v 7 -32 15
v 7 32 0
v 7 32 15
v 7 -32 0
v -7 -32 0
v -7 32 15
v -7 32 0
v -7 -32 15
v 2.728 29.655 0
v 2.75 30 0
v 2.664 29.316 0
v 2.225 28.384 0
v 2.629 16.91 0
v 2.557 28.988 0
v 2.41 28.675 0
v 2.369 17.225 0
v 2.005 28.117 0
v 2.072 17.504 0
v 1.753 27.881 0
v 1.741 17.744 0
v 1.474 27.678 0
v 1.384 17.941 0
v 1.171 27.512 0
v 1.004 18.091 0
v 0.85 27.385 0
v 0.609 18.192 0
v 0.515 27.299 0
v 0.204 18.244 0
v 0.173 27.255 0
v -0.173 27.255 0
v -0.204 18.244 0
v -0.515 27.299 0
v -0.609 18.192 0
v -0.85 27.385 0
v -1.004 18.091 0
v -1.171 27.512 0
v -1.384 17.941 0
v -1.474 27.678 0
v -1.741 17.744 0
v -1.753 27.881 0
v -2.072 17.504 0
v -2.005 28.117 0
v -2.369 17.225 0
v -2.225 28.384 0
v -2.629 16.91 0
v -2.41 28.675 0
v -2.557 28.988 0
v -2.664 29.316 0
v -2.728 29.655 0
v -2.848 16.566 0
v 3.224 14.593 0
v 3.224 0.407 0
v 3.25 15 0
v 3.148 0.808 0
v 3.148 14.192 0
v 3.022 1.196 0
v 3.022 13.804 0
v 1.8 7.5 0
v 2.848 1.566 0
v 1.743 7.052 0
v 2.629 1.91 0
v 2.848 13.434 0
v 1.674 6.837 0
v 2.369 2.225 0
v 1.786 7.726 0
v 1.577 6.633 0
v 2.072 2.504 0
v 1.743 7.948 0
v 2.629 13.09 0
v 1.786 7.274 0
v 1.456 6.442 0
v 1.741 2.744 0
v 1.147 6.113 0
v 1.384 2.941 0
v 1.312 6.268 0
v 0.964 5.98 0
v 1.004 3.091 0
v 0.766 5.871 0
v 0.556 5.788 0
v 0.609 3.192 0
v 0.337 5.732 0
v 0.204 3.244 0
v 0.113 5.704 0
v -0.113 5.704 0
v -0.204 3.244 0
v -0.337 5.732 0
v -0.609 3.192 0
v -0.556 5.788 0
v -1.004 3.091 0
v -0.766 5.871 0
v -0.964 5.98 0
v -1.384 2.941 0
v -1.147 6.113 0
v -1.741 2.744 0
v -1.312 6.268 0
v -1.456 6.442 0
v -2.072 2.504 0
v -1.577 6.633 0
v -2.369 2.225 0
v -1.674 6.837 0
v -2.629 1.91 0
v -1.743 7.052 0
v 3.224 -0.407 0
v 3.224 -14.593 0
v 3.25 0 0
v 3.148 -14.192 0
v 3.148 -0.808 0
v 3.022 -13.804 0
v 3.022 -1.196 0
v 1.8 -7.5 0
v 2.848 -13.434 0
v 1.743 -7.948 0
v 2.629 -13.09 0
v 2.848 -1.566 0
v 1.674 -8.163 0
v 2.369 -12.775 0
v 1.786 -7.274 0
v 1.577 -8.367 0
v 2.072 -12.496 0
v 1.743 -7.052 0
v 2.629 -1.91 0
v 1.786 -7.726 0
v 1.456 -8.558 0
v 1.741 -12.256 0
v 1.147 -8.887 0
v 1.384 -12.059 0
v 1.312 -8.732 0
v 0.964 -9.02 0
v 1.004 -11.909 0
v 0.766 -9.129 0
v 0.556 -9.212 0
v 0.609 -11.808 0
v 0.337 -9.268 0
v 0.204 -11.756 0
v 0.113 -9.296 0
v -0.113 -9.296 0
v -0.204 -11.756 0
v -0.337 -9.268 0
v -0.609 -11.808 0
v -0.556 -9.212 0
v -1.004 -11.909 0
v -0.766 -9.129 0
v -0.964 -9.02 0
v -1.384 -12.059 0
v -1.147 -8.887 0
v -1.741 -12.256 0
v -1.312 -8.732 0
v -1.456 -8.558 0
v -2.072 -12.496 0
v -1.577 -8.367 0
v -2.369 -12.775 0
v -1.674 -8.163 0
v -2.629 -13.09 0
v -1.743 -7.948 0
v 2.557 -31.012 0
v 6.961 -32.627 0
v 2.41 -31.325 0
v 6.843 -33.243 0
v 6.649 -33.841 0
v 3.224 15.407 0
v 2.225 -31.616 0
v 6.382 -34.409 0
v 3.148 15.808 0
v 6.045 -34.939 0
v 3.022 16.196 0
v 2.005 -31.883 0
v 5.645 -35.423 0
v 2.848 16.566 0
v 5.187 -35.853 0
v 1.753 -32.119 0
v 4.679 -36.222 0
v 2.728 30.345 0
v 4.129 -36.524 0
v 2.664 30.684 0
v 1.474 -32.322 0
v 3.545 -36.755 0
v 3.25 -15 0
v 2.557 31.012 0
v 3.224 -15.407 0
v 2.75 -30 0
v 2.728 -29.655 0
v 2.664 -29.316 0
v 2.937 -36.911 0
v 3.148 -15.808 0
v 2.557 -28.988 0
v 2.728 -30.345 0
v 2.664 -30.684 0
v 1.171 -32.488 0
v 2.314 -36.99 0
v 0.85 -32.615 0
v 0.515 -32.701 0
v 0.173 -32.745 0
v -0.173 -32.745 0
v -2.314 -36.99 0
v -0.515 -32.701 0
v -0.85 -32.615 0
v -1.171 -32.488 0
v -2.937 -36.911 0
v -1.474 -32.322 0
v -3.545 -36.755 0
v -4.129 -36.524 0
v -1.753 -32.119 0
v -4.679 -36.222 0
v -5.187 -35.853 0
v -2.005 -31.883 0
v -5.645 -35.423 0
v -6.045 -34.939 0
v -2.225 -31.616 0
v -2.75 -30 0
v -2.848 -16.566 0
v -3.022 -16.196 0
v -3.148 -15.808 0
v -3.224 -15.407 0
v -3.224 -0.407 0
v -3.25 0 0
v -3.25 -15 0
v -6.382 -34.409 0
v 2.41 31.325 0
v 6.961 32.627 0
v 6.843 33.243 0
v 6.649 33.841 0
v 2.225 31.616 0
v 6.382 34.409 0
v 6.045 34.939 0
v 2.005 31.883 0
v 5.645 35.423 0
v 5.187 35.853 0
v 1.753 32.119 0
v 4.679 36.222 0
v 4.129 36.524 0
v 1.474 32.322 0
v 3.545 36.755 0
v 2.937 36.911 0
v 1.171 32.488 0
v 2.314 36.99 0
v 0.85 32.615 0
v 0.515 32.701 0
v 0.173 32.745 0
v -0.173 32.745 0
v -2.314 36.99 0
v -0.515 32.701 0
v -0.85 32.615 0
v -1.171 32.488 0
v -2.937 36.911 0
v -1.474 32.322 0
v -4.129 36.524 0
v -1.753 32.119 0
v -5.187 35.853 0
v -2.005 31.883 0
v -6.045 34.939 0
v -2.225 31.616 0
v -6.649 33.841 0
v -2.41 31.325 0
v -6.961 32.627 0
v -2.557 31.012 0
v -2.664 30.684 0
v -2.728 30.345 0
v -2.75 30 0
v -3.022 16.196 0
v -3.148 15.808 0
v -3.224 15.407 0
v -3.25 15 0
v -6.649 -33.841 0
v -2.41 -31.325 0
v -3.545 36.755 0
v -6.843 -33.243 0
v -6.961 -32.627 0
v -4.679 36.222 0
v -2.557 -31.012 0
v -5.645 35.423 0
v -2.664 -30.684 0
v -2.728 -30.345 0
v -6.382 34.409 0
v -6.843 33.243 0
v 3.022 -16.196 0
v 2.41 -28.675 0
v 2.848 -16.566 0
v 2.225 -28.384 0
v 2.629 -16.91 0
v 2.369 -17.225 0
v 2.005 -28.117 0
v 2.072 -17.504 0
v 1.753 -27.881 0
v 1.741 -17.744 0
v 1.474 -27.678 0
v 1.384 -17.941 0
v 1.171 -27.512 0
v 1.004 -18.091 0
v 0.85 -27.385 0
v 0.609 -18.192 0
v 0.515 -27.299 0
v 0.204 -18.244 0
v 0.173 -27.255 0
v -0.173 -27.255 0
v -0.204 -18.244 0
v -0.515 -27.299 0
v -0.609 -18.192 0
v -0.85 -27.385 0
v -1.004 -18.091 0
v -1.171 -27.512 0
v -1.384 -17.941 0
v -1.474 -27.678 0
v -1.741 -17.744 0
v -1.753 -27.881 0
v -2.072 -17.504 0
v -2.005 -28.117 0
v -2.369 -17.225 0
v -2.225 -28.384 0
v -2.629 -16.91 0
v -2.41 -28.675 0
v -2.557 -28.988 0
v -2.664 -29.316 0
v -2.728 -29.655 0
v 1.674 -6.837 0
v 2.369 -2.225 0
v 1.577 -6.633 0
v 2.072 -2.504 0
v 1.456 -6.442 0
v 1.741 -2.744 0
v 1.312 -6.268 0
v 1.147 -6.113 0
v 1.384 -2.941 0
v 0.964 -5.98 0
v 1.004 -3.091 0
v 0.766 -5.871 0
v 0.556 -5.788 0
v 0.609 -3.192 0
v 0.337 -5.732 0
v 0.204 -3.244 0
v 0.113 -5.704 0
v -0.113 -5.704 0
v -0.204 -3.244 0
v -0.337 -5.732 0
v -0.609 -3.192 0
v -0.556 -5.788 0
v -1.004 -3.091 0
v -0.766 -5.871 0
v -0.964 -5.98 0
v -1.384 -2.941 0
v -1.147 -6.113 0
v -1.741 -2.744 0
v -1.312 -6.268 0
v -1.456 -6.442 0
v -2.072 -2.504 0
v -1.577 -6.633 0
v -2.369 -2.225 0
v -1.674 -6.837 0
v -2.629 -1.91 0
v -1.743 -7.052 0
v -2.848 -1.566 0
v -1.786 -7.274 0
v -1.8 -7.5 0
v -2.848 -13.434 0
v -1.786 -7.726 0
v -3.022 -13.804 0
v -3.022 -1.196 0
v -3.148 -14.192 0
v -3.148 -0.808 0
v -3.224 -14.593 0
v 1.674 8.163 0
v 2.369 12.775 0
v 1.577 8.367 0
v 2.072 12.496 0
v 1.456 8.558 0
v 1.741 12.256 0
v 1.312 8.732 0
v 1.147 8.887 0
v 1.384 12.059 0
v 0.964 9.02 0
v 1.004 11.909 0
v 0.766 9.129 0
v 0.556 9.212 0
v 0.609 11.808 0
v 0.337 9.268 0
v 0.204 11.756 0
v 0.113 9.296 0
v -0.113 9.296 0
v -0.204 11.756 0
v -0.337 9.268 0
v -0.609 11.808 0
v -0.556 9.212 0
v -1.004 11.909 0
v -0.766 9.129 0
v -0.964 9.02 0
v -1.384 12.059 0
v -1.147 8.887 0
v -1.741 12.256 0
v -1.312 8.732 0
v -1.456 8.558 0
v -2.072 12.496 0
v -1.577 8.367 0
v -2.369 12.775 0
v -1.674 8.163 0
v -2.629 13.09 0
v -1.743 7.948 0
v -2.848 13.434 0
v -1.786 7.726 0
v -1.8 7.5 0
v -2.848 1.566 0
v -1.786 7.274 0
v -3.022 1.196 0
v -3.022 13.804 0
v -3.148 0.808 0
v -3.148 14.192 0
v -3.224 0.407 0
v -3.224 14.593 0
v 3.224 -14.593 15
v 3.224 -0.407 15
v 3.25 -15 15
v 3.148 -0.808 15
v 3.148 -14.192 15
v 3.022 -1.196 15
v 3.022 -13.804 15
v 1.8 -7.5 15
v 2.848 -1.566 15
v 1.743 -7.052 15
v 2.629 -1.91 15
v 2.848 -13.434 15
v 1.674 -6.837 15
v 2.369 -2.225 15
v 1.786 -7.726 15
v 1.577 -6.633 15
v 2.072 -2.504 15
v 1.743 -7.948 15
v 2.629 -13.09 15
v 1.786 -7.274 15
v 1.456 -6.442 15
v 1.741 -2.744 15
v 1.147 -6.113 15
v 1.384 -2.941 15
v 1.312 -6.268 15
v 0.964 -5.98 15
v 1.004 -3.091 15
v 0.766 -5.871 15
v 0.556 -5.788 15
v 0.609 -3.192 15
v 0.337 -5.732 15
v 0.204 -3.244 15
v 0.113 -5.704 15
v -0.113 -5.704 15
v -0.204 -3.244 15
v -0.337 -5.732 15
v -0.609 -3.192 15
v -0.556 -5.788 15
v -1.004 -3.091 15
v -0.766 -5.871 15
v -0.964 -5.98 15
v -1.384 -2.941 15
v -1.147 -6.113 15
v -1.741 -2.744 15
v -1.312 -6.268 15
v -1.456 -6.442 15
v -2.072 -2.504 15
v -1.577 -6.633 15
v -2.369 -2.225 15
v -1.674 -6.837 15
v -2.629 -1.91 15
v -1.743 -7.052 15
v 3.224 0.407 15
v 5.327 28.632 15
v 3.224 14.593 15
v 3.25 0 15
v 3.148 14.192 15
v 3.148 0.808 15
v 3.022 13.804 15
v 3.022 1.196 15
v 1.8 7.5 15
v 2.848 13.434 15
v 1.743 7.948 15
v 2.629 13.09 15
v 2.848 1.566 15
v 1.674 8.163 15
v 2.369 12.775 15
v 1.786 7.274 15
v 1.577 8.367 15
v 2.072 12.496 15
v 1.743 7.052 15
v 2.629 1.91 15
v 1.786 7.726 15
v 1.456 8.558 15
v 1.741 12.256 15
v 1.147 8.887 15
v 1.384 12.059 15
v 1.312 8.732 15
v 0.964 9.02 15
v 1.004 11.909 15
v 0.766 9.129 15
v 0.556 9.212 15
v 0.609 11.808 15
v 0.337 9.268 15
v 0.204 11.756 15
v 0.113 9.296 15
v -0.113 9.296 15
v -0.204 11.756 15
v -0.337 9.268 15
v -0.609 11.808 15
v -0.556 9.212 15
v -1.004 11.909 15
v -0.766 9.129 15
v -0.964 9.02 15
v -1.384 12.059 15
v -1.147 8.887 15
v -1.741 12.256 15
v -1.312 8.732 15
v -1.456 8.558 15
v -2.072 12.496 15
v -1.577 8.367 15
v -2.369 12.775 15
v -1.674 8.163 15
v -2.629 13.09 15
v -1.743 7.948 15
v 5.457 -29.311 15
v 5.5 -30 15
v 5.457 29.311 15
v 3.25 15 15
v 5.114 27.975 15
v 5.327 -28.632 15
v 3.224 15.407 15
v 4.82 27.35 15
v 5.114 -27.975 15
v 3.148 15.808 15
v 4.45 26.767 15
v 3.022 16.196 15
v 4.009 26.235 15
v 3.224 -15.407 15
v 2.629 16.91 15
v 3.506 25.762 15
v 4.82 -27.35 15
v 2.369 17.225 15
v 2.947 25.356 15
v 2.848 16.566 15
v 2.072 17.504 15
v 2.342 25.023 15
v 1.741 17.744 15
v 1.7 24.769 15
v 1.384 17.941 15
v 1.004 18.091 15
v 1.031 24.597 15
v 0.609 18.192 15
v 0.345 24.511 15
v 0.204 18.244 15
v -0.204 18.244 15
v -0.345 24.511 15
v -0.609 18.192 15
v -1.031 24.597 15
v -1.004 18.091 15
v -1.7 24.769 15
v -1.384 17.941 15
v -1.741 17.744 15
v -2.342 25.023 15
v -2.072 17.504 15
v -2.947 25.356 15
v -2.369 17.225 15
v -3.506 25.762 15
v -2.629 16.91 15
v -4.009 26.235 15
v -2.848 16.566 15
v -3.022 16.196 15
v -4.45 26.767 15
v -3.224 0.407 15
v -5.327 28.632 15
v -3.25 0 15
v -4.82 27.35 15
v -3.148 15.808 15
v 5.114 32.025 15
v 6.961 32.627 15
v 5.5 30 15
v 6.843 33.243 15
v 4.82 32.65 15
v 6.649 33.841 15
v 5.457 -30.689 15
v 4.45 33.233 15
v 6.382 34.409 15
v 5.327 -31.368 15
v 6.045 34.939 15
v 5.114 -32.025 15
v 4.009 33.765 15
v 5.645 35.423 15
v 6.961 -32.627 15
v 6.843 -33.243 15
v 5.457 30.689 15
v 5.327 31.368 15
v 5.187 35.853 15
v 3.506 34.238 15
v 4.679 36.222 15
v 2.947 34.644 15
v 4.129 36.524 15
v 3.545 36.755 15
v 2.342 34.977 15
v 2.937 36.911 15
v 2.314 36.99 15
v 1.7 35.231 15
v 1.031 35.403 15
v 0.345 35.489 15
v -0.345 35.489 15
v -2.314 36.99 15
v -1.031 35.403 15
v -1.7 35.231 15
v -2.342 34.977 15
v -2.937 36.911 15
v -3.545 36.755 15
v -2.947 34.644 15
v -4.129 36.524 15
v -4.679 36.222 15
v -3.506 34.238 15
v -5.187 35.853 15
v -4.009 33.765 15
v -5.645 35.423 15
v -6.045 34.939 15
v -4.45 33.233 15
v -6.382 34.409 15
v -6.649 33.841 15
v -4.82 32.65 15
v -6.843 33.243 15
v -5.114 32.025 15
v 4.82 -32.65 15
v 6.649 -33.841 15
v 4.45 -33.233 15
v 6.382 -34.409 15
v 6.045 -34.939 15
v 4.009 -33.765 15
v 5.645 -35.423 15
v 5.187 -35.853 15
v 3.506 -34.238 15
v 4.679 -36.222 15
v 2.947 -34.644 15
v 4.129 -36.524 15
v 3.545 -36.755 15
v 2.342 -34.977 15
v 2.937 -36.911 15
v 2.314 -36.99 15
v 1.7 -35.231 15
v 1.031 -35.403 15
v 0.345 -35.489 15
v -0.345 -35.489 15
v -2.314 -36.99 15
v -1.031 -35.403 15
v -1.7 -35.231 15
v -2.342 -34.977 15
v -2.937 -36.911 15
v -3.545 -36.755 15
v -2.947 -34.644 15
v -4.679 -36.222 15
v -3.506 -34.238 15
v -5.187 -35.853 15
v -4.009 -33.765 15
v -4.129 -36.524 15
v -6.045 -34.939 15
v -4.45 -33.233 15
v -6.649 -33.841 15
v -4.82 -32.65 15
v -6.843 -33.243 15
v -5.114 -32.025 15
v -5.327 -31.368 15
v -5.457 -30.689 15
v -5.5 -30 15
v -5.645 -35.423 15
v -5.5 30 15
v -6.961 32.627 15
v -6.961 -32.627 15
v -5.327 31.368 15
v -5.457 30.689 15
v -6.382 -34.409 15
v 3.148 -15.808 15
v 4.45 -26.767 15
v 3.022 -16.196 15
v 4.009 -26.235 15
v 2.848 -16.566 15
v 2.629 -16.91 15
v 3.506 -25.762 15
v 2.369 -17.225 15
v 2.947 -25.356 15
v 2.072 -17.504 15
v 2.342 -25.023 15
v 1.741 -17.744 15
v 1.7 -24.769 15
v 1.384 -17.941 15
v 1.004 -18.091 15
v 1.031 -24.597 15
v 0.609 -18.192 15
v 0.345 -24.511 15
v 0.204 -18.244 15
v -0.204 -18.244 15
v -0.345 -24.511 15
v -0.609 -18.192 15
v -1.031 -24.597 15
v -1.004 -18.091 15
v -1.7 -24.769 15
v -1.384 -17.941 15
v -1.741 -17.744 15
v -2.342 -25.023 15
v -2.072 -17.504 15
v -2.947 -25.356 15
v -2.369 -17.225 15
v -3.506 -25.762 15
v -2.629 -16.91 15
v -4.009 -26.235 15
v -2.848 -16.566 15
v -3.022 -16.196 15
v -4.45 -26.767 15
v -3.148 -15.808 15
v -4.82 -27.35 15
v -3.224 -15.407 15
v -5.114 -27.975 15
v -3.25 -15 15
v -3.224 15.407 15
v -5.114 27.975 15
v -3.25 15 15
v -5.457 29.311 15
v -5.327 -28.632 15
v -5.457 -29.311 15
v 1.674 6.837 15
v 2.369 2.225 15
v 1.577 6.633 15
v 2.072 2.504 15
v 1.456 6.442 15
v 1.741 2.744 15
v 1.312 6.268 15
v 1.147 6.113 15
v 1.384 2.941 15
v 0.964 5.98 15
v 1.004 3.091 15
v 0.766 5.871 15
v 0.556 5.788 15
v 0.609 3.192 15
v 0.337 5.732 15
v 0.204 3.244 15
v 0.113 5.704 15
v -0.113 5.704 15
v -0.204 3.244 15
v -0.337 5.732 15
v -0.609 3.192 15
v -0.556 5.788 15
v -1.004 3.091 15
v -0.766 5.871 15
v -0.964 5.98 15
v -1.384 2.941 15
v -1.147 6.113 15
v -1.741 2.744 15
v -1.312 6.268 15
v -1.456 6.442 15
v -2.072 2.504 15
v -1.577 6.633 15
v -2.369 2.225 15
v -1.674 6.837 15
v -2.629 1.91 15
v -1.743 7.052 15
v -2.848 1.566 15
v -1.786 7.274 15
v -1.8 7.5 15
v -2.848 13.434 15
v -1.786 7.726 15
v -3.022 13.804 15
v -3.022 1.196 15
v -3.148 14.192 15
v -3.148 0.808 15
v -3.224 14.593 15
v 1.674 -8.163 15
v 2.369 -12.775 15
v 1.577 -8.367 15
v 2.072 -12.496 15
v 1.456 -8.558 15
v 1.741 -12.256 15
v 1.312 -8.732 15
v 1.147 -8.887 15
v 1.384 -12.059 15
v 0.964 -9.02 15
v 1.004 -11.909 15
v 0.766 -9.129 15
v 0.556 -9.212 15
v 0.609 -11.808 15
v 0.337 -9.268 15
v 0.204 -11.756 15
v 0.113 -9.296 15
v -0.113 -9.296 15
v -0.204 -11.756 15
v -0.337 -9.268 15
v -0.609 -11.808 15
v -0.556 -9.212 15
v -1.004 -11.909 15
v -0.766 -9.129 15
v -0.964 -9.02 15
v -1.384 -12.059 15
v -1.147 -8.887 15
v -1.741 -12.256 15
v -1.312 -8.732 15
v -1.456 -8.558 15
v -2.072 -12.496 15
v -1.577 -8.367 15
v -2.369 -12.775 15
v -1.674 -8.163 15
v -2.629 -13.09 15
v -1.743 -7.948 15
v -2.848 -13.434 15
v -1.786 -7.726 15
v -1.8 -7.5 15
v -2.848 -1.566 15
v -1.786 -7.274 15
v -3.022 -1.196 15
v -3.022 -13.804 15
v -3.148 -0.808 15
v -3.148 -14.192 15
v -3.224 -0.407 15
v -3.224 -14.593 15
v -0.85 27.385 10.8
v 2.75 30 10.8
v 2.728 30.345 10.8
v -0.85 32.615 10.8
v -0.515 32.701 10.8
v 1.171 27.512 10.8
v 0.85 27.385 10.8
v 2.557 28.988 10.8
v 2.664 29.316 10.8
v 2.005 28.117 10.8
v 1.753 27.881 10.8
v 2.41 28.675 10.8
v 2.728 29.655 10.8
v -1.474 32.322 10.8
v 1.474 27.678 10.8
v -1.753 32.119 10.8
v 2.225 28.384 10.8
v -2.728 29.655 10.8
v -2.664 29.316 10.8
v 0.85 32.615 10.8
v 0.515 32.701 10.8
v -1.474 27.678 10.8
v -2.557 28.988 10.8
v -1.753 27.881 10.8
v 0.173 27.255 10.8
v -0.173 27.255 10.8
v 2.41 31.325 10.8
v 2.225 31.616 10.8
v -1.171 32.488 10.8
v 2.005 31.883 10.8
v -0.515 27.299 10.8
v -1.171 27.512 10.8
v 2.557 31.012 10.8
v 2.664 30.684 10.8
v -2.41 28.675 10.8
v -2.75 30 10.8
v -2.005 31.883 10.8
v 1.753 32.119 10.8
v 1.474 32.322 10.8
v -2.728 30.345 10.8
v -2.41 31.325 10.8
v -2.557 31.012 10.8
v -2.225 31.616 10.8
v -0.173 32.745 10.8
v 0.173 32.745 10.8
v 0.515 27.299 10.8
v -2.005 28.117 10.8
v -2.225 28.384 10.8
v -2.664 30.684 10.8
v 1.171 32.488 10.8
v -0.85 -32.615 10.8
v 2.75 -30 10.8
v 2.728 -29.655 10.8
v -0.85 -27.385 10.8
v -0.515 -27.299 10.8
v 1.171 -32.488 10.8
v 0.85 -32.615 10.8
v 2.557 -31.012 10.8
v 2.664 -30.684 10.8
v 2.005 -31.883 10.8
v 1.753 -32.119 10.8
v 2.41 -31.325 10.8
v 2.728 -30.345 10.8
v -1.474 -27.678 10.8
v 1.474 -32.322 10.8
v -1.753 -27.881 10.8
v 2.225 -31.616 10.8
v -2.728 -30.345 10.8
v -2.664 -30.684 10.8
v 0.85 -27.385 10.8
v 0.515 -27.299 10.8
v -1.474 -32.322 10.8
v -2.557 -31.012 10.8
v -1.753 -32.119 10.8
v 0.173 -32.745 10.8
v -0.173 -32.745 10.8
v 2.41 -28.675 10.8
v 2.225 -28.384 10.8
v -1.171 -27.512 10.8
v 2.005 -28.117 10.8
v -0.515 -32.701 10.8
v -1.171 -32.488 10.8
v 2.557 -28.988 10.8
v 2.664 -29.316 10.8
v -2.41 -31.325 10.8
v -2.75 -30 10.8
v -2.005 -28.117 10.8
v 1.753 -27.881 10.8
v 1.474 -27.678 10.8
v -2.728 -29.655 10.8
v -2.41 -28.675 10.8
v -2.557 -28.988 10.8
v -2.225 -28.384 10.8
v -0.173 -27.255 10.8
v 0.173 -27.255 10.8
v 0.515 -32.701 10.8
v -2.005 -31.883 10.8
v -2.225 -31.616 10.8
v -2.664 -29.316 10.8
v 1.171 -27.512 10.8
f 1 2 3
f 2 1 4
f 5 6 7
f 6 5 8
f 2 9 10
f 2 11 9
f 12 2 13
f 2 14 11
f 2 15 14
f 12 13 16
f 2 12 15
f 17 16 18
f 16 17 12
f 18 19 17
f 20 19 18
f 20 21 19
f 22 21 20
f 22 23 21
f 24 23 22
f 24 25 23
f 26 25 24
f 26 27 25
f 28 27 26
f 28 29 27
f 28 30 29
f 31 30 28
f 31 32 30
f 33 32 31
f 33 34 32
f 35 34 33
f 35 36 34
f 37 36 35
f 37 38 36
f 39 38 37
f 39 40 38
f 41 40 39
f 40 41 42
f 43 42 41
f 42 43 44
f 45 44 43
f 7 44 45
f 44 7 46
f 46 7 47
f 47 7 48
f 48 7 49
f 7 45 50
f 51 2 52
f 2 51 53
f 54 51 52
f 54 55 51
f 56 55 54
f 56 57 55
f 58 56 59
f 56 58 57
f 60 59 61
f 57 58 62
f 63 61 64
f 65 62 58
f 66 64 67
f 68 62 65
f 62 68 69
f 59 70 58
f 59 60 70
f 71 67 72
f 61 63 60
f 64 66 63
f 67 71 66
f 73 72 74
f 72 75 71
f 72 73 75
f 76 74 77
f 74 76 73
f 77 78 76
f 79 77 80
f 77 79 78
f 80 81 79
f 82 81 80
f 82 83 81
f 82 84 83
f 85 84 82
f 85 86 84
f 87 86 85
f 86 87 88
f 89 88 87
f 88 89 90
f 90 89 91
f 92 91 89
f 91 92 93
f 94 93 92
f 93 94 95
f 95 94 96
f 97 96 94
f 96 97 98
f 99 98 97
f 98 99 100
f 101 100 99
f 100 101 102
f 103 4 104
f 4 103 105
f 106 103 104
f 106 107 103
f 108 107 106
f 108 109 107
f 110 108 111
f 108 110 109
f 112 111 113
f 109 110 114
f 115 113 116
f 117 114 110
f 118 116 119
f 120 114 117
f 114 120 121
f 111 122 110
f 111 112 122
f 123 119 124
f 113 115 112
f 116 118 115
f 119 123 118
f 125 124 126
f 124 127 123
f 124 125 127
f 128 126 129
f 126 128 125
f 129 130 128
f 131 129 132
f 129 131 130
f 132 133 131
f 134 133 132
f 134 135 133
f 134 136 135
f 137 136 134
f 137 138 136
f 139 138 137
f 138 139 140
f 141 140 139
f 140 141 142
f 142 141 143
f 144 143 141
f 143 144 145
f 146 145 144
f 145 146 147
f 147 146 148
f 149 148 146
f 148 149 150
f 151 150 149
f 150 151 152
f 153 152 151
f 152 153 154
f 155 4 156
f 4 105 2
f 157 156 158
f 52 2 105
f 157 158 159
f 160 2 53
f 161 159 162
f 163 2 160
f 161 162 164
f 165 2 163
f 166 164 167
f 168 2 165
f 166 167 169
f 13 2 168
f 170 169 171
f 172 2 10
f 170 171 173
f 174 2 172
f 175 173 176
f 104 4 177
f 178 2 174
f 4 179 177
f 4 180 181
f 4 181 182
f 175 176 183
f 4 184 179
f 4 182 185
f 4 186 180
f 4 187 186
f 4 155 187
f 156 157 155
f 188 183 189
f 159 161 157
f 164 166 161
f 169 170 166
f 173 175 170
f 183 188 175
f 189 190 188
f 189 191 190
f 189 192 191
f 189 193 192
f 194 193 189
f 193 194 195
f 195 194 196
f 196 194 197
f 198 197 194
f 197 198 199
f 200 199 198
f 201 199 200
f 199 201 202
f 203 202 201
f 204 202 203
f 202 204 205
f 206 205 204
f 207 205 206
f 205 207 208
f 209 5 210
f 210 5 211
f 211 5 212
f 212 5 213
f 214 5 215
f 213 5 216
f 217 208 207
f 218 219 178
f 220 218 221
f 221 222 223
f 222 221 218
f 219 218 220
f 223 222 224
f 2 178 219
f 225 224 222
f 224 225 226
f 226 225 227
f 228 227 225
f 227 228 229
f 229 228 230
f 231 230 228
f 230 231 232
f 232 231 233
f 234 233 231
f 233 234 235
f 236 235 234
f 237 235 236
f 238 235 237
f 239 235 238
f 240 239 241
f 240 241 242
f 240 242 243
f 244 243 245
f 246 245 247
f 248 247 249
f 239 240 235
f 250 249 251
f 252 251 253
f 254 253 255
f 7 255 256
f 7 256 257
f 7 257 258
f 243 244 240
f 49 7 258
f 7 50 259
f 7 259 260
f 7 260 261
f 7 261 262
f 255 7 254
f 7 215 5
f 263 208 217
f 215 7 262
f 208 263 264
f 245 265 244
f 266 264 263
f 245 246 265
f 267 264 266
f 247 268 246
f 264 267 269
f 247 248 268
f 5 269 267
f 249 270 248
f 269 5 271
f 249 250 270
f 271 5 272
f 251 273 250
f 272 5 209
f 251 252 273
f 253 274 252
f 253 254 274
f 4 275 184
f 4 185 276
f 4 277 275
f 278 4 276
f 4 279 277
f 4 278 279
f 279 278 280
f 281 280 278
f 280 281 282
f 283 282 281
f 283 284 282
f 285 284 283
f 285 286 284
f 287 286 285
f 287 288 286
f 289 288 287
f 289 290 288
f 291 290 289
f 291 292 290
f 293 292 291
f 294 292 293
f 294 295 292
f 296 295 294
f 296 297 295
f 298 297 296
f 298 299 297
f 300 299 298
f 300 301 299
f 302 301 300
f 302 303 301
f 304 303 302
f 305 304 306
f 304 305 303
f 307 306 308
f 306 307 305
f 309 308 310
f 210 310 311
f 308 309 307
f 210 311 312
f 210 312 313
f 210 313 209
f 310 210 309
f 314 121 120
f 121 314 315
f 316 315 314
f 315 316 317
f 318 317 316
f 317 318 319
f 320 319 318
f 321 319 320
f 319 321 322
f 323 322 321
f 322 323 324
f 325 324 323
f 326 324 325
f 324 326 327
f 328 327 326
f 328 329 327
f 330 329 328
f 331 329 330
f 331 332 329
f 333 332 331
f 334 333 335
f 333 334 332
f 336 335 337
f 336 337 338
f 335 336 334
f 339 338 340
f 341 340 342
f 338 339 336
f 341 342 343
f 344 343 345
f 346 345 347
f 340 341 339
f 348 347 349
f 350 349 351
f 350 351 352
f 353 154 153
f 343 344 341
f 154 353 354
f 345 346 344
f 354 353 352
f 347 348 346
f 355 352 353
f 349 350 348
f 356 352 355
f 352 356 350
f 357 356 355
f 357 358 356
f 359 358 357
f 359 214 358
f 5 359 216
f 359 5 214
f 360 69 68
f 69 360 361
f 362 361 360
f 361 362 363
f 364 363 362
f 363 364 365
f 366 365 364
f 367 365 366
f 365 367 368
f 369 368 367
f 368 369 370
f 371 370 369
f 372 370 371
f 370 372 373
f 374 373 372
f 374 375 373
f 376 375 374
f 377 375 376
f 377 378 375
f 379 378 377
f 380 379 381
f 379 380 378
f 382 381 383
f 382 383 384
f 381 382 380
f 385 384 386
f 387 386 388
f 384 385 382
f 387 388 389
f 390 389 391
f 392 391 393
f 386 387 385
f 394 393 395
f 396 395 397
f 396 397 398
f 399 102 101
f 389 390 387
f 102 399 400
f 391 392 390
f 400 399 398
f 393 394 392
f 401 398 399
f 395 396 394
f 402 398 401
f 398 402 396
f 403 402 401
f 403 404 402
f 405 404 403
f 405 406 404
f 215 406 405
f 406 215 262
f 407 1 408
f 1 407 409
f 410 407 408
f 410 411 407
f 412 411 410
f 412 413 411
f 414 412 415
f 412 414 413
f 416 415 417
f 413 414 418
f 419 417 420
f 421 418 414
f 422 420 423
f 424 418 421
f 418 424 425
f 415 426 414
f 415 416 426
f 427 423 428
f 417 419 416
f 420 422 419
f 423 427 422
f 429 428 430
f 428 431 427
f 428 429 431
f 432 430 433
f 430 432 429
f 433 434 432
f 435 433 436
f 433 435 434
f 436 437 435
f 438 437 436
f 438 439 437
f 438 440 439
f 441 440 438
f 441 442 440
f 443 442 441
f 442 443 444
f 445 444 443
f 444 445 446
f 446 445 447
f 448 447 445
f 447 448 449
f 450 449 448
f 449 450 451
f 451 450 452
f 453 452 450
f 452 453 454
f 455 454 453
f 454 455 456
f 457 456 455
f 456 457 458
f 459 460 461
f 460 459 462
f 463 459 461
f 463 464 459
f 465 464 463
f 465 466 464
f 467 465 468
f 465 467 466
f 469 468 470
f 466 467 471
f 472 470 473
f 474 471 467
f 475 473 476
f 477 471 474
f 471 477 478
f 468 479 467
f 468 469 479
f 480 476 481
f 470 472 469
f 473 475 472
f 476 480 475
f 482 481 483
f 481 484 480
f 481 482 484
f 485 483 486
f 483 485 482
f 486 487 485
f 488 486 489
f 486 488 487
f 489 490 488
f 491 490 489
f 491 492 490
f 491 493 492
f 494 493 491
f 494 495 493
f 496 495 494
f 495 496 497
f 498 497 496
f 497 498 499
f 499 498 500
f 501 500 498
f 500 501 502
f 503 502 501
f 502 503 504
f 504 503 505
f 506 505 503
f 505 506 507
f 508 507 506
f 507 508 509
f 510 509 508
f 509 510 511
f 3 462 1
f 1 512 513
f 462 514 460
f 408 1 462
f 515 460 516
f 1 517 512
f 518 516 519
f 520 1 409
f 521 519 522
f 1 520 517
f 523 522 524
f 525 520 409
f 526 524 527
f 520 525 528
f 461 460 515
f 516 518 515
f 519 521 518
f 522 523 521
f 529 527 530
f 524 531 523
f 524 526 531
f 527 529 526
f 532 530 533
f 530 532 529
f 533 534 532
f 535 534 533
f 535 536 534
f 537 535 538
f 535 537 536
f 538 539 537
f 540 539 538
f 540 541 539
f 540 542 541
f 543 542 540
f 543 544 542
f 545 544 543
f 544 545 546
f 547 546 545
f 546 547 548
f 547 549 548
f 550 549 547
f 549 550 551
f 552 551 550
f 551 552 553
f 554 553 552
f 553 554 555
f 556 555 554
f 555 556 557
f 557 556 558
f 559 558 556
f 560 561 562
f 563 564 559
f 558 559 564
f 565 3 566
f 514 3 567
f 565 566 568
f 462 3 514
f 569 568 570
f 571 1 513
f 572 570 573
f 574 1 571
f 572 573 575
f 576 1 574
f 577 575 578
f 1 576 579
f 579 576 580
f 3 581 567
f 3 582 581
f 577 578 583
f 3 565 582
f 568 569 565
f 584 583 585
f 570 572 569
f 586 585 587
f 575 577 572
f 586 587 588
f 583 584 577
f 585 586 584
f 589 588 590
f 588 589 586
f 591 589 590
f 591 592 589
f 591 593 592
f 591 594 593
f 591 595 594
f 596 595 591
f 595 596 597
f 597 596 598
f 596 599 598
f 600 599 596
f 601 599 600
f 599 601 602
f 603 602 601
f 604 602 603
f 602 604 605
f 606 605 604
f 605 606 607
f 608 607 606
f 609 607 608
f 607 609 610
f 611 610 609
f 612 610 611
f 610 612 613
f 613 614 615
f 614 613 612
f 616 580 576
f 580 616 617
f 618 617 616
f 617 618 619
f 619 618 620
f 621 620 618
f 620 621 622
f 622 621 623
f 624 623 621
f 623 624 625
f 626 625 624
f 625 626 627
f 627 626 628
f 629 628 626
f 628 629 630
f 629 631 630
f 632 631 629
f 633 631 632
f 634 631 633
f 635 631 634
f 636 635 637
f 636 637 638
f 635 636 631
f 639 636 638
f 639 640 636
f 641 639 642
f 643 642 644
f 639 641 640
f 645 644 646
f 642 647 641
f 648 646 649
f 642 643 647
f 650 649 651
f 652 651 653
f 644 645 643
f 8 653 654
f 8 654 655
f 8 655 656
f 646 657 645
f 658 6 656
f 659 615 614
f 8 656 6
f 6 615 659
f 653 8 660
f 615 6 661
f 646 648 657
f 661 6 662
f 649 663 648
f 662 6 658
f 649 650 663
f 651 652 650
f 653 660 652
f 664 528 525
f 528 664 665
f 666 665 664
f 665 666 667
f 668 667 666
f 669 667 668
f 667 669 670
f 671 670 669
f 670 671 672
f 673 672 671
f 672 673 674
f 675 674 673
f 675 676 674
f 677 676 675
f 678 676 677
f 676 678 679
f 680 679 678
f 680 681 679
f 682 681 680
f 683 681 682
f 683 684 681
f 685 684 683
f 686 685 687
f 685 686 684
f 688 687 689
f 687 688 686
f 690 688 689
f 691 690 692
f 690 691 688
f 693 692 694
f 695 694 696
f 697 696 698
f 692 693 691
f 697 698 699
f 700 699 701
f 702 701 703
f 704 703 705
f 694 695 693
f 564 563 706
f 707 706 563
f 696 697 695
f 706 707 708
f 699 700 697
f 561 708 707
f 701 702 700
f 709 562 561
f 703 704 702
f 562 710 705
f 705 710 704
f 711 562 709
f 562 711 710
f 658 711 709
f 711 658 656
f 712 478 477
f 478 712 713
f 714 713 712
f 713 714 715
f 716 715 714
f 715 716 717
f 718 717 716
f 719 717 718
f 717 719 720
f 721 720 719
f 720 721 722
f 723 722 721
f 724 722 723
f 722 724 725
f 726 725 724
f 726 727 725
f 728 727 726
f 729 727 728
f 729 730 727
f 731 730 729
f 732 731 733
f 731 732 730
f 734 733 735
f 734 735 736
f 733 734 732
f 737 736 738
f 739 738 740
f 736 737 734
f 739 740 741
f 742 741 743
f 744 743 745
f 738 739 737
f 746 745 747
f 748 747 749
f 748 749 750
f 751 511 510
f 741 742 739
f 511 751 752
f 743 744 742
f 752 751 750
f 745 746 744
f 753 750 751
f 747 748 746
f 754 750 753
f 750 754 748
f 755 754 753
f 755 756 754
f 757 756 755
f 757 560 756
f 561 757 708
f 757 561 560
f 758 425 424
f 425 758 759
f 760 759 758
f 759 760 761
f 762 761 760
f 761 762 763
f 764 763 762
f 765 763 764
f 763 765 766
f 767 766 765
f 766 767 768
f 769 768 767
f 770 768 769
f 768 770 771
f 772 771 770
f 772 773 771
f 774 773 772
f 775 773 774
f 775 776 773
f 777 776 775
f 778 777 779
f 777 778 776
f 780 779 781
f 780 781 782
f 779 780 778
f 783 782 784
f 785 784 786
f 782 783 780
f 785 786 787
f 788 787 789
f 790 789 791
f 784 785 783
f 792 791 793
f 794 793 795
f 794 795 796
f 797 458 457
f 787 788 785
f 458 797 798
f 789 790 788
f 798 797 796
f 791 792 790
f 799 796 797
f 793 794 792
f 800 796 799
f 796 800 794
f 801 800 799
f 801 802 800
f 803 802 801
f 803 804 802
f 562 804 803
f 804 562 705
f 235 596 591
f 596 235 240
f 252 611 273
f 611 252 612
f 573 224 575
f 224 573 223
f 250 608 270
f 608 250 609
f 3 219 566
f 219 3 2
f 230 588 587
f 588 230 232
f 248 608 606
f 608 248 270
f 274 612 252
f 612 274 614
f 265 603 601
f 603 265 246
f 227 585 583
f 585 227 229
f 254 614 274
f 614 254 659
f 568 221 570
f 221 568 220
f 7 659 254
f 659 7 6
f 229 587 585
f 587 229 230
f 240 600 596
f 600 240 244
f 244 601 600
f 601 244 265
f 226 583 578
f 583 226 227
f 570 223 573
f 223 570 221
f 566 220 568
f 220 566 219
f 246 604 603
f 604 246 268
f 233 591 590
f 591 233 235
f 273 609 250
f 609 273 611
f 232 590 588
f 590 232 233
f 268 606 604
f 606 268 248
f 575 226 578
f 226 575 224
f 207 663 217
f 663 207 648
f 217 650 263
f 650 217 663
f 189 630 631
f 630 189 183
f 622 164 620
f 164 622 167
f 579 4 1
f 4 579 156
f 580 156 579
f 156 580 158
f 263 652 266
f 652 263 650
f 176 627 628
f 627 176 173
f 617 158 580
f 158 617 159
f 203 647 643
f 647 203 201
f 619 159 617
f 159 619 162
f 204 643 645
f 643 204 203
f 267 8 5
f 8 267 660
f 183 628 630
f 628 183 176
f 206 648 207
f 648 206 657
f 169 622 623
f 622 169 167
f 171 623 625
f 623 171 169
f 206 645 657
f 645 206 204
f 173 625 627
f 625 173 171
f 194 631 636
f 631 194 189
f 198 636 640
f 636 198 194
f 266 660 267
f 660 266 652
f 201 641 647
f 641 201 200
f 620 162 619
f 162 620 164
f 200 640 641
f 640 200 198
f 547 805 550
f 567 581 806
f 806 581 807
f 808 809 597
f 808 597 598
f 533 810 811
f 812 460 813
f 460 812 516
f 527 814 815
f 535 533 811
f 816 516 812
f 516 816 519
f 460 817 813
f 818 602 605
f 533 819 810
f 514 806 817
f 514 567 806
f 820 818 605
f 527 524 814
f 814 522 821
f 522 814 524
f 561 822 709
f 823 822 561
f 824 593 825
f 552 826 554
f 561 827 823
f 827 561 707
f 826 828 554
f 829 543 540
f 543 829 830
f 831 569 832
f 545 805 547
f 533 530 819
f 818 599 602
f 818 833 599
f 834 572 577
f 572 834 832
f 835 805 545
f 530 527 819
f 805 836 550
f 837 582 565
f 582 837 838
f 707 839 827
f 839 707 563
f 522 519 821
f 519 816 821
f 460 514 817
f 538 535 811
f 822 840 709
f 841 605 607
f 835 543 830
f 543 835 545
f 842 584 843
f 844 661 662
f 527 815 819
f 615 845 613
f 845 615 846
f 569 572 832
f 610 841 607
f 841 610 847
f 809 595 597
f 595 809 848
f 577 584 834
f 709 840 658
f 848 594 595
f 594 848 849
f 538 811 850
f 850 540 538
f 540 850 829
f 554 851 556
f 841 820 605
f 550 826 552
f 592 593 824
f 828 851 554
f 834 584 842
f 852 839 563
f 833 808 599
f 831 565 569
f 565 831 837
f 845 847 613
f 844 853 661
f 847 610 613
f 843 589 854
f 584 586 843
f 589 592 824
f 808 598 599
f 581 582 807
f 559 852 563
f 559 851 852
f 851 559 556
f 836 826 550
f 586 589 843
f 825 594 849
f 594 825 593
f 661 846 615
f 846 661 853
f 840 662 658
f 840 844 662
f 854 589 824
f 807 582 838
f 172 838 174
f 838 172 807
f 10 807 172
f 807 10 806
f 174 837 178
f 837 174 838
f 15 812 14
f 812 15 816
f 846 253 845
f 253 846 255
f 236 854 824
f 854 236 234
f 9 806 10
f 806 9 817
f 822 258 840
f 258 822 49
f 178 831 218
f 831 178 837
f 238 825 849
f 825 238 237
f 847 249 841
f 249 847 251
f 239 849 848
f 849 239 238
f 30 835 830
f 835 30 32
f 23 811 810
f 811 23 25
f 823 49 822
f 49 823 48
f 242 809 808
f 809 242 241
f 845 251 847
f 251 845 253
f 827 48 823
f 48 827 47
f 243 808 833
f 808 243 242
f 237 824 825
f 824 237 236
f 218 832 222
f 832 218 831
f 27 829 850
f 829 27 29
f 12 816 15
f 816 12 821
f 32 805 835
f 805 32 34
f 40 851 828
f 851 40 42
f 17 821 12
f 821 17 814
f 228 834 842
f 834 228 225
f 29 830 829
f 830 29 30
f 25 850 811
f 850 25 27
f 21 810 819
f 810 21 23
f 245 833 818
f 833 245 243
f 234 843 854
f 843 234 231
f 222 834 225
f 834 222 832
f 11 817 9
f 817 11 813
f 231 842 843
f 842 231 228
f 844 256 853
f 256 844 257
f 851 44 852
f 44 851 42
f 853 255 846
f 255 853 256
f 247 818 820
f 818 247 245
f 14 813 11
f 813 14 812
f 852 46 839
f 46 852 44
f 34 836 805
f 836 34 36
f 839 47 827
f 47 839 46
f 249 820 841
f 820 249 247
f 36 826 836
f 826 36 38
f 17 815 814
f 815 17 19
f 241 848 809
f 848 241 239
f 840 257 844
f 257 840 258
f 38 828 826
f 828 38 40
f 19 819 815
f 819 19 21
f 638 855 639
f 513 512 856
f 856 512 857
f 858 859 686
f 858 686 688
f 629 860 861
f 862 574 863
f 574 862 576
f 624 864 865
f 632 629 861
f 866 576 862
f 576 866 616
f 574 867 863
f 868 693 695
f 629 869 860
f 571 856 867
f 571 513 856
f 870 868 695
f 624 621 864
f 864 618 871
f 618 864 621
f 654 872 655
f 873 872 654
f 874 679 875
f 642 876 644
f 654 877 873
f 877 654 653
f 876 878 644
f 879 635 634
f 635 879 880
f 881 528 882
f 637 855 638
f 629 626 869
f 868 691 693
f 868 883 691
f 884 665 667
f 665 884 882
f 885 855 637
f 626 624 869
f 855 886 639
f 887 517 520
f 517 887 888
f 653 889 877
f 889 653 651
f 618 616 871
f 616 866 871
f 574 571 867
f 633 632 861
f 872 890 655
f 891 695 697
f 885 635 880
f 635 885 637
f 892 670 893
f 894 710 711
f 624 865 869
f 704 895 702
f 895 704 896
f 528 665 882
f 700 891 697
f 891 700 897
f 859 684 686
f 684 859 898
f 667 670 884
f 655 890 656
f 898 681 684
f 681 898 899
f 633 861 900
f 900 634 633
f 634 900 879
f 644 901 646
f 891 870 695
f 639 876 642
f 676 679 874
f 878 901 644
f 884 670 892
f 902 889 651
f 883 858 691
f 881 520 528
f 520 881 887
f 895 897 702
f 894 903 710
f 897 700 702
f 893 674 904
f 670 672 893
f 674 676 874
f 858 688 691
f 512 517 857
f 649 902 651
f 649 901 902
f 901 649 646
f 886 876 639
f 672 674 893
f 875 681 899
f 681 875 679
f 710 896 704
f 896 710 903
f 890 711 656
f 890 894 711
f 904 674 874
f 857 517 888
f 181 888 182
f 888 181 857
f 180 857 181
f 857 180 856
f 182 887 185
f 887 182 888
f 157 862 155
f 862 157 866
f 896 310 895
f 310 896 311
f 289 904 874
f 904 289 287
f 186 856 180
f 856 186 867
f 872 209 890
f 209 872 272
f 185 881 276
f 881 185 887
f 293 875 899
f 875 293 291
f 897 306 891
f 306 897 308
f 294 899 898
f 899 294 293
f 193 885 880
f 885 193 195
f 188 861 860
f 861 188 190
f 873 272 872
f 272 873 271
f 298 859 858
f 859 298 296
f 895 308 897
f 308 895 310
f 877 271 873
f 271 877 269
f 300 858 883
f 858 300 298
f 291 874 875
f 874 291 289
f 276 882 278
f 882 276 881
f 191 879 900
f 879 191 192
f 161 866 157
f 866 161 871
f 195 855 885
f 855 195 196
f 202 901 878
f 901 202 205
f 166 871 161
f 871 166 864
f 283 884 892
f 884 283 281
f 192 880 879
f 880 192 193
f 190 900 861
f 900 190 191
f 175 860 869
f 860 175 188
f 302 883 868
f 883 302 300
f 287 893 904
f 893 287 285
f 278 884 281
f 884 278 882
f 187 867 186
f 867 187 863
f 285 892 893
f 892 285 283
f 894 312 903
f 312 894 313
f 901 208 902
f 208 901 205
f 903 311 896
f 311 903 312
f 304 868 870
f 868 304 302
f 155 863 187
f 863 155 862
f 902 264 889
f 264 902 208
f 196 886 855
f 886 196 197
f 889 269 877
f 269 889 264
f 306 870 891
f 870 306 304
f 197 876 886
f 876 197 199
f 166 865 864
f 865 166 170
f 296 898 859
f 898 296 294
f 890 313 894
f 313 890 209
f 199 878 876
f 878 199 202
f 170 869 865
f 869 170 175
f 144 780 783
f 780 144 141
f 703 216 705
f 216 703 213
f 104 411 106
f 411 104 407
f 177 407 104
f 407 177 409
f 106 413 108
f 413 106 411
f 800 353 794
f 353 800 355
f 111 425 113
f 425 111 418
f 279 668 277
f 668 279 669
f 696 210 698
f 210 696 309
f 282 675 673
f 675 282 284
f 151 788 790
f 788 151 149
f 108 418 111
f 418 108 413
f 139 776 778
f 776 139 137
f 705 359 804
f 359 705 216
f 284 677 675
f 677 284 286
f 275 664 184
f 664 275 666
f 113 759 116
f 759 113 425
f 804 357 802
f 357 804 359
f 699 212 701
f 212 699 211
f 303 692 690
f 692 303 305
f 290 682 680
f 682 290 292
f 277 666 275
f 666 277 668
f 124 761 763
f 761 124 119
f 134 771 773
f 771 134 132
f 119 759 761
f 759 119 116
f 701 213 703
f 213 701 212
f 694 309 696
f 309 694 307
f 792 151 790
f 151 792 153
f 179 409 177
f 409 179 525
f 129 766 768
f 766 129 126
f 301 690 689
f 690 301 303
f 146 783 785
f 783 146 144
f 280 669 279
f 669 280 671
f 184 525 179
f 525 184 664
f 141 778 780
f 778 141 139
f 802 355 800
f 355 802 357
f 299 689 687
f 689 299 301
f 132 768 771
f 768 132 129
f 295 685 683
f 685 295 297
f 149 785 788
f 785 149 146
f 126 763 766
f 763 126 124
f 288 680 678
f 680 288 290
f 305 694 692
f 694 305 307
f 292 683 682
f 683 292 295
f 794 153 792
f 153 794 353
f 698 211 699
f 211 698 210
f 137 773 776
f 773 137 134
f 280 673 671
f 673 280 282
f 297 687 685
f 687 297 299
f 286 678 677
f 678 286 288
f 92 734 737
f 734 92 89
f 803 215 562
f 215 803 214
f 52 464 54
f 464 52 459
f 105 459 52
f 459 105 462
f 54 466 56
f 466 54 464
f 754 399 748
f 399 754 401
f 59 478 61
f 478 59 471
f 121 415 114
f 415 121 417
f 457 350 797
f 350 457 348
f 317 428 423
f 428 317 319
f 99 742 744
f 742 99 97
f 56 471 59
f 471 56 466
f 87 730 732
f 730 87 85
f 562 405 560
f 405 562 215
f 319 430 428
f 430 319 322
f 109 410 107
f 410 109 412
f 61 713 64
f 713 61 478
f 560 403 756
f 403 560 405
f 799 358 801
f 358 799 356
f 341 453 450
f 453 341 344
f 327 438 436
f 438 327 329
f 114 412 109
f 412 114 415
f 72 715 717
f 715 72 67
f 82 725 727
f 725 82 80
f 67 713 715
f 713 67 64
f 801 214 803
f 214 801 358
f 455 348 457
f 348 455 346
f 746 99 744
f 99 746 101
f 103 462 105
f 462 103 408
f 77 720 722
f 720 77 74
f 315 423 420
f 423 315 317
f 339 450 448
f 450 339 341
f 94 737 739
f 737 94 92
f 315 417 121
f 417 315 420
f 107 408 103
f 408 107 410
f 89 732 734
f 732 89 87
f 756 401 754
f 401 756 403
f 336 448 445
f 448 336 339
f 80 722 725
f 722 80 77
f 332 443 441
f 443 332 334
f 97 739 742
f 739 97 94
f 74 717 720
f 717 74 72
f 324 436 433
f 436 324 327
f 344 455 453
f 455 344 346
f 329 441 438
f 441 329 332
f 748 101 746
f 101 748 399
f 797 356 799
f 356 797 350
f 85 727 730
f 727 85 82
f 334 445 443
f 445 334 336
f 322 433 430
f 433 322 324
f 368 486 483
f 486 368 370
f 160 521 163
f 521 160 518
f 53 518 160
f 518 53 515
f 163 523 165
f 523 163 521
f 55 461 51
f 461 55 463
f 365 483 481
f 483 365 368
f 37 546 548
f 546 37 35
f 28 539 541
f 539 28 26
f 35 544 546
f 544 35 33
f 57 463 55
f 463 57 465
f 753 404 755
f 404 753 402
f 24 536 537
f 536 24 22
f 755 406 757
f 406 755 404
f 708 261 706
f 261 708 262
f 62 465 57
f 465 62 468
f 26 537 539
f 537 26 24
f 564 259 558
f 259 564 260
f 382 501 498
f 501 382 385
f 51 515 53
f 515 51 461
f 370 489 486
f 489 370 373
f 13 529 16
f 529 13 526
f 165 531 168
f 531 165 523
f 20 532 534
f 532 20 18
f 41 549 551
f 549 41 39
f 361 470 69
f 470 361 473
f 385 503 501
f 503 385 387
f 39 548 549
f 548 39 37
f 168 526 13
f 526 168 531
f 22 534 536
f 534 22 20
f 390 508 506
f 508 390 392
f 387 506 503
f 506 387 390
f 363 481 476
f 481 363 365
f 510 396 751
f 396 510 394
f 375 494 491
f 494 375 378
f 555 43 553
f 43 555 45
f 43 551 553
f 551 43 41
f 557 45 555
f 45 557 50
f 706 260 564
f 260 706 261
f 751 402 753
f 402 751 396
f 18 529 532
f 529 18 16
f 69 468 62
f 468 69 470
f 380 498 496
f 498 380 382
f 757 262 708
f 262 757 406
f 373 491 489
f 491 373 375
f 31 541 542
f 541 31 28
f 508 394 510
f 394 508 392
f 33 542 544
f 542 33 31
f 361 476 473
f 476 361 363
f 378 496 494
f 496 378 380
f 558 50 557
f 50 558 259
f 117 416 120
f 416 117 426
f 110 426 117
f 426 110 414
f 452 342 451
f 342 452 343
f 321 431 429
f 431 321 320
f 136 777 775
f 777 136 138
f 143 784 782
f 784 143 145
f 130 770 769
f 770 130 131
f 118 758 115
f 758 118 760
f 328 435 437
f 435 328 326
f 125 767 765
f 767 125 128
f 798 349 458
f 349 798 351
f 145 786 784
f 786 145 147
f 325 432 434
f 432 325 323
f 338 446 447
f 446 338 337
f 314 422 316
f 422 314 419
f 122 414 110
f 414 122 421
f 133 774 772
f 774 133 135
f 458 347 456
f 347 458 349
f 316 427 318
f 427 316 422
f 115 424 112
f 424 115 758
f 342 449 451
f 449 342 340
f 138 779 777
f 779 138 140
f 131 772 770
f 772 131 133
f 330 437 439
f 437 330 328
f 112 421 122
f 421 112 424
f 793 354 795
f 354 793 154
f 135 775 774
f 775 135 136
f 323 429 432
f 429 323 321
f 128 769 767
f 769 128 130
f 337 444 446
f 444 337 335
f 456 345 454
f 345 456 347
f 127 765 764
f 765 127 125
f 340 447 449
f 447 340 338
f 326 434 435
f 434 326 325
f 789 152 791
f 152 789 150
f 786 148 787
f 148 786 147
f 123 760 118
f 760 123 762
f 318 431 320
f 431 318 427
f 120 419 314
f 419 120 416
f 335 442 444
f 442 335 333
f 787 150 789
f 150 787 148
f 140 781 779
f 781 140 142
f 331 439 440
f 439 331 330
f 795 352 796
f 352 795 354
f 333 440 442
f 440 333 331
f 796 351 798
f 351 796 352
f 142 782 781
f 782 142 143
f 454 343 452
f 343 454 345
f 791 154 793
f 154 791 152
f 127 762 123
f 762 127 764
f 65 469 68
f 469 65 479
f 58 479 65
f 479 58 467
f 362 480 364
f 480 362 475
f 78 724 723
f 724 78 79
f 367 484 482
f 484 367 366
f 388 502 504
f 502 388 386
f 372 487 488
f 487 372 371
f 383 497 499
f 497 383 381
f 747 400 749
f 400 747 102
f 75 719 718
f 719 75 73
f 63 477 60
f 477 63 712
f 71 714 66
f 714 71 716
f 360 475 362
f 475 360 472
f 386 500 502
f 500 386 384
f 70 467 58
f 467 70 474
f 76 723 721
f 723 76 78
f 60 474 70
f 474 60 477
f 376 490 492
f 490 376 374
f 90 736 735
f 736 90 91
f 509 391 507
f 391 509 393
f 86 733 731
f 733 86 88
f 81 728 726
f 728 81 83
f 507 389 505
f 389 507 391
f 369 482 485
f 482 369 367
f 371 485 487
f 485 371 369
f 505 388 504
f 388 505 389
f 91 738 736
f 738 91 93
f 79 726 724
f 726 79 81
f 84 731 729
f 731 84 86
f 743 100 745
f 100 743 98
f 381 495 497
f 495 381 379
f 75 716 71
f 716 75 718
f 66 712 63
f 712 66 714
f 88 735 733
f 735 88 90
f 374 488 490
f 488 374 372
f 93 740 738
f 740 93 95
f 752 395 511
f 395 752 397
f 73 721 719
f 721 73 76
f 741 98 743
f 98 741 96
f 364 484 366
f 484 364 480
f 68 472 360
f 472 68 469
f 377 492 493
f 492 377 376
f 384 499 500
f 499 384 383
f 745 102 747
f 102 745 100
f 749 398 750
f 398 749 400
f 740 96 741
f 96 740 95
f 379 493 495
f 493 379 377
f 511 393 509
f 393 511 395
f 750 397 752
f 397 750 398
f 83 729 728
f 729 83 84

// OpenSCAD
$fn = 50;


difference() {
	union() {
		hull() {
			translate(v = [-2.0000000000, 17.0000000000, 0]) {
				cylinder(h = 15, r = 5);
			}
			translate(v = [2.0000000000, 17.0000000000, 0]) {
				cylinder(h = 15, r = 5);
			}
			translate(v = [-2.0000000000, -17.0000000000, 0]) {
				cylinder(h = 15, r = 5);
			}
			translate(v = [2.0000000000, -17.0000000000, 0]) {
				cylinder(h = 15, r = 5);
			}
		}
		translate(v = [0.0000000000, 22.5000000000, 0]) {
			hull() {
				translate(v = [-2.0000000000, 9.5000000000, 0]) {
					cylinder(h = 15, r = 5);
				}
				translate(v = [2.0000000000, 9.5000000000, 0]) {
					cylinder(h = 15, r = 5);
				}
				translate(v = [-2.0000000000, -9.5000000000, 0]) {
					cylinder(h = 15, r = 5);
				}
				translate(v = [2.0000000000, -9.5000000000, 0]) {
					cylinder(h = 15, r = 5);
				}
			}
		}
		translate(v = [0.0000000000, 22.5000000000, 0]) {
			hull() {
				translate(v = [-2.0000000000, 9.5000000000, 0]) {
					cylinder(h = 15, r = 5);
				}
				translate(v = [2.0000000000, 9.5000000000, 0]) {
					cylinder(h = 15, r = 5);
				}
				translate(v = [-2.0000000000, -9.5000000000, 0]) {
					cylinder(h = 15, r = 5);
				}
				translate(v = [2.0000000000, -9.5000000000, 0]) {
					cylinder(h = 15, r = 5);
				}
			}
		}
		translate(v = [0.0000000000, -22.5000000000, 0]) {
			hull() {
				translate(v = [-2.0000000000, 9.5000000000, 0]) {
					cylinder(h = 15, r = 5);
				}
				translate(v = [2.0000000000, 9.5000000000, 0]) {
					cylinder(h = 15, r = 5);
				}
				translate(v = [-2.0000000000, -9.5000000000, 0]) {
					cylinder(h = 15, r = 5);
				}
				translate(v = [2.0000000000, -9.5000000000, 0]) {
					cylinder(h = 15, r = 5);
				}
			}
		}
		translate(v = [0.0000000000, -22.5000000000, 0]) {
			hull() {
				translate(v = [-2.0000000000, 9.5000000000, 0]) {
					cylinder(h = 15, r = 5);
				}
				translate(v = [2.0000000000, 9.5000000000, 0]) {
					cylinder(h = 15, r = 5);
				}
				translate(v = [-2.0000000000, -9.5000000000, 0]) {
					cylinder(h = 15, r = 5);
				}
				translate(v = [2.0000000000, -9.5000000000, 0]) {
					cylinder(h = 15, r = 5);
				}
			}
		}
	}
	union() {
		translate(v = [0.0000000000, 30.0000000000, 15]) {
			rotate(a = [0, 0, 0]) {
				difference() {
					union() {
						#translate(v = [0, 0, -15.0000000000]) {
							cylinder(h = 15, r = 2.2500000000);
						}
						#translate(v = [0, 0, -4.2000000000]) {
							cylinder(h = 4.2000000000, r1 = 2.7500000000, r2 = 5.5000000000);
						}
						#translate(v = [0, 0, -15.0000000000]) {
							cylinder(h = 15, r = 2.7500000000);
						}
						#translate(v = [0, 0, -15.0000000000]) {
							cylinder(h = 15, r = 2.2500000000);
						}
					}
					union();
				}
			}
		}
		translate(v = [0.0000000000, 30.0000000000, 15]) {
			rotate(a = [0, 0, 0]) {
				difference() {
					union() {
						#translate(v = [0, 0, -15.0000000000]) {
							cylinder(h = 15, r = 2.2500000000);
						}
						#translate(v = [0, 0, -4.2000000000]) {
							cylinder(h = 4.2000000000, r1 = 2.7500000000, r2 = 5.5000000000);
						}
						#translate(v = [0, 0, -15.0000000000]) {
							cylinder(h = 15, r = 2.7500000000);
						}
						#translate(v = [0, 0, -15.0000000000]) {
							cylinder(h = 15, r = 2.2500000000);
						}
					}
					union();
				}
			}
		}
		translate(v = [0.0000000000, -30.0000000000, 15]) {
			rotate(a = [0, 0, 0]) {
				difference() {
					union() {
						#translate(v = [0, 0, -15.0000000000]) {
							cylinder(h = 15, r = 2.2500000000);
						}
						#translate(v = [0, 0, -4.2000000000]) {
							cylinder(h = 4.2000000000, r1 = 2.7500000000, r2 = 5.5000000000);
						}
						#translate(v = [0, 0, -15.0000000000]) {
							cylinder(h = 15, r = 2.7500000000);
						}
						#translate(v = [0, 0, -15.0000000000]) {
							cylinder(h = 15, r = 2.2500000000);
						}
					}
					union();
				}
			}
		}
		translate(v = [0.0000000000, -30.0000000000, 15]) {
			rotate(a = [0, 0, 0]) {
				difference() {
					union() {
						#translate(v = [0, 0, -15.0000000000]) {
							cylinder(h = 15, r = 2.2500000000);
						}
						#translate(v = [0, 0, -4.2000000000]) {
							cylinder(h = 4.2000000000, r1 = 2.7500000000, r2 = 5.5000000000);
						}
						#translate(v = [0, 0, -15.0000000000]) {
							cylinder(h = 15, r = 2.7500000000);
						}
						#translate(v = [0, 0, -15.0000000000]) {
							cylinder(h = 15, r = 2.2500000000);
						}
					}
					union();
				}
			}
		}
		translate(v = [0.0000000000, -15.0000000000, 0]) {
			translate(v = [0, 0, -100]) {
				cylinder(h = 200, r = 3.2500000000);
			}
		}
		translate(v = [0, 0, -100]) {
			cylinder(h = 200, r = 3.2500000000);
		}
		translate(v = [0.0000000000, 15.0000000000, 0]) {
			translate(v = [0, 0, -100]) {
				cylinder(h = 200, r = 3.2500000000);
			}
		}
		translate(v = [0.0000000000, -15.0000000000, 0]) {
			translate(v = [0, 0, -100]) {
				cylinder(h = 200, r = 1.8000000000);
			}
		}
		translate(v = [0.0000000000, -7.5000000000, 0]) {
			translate(v = [0, 0, -100]) {
				cylinder(h = 200, r = 1.8000000000);
			}
		}
		translate(v = [0, 0, -100]) {
			cylinder(h = 200, r = 1.8000000000);
		}
		translate(v = [0.0000000000, 7.5000000000, 0]) {
			translate(v = [0, 0, -100]) {
				cylinder(h = 200, r = 1.8000000000);
			}
		}
		translate(v = [0.0000000000, 15.0000000000, 0]) {
			translate(v = [0, 0, -100]) {
				cylinder(h = 200, r = 1.8000000000);
			}
		}
	}
}
